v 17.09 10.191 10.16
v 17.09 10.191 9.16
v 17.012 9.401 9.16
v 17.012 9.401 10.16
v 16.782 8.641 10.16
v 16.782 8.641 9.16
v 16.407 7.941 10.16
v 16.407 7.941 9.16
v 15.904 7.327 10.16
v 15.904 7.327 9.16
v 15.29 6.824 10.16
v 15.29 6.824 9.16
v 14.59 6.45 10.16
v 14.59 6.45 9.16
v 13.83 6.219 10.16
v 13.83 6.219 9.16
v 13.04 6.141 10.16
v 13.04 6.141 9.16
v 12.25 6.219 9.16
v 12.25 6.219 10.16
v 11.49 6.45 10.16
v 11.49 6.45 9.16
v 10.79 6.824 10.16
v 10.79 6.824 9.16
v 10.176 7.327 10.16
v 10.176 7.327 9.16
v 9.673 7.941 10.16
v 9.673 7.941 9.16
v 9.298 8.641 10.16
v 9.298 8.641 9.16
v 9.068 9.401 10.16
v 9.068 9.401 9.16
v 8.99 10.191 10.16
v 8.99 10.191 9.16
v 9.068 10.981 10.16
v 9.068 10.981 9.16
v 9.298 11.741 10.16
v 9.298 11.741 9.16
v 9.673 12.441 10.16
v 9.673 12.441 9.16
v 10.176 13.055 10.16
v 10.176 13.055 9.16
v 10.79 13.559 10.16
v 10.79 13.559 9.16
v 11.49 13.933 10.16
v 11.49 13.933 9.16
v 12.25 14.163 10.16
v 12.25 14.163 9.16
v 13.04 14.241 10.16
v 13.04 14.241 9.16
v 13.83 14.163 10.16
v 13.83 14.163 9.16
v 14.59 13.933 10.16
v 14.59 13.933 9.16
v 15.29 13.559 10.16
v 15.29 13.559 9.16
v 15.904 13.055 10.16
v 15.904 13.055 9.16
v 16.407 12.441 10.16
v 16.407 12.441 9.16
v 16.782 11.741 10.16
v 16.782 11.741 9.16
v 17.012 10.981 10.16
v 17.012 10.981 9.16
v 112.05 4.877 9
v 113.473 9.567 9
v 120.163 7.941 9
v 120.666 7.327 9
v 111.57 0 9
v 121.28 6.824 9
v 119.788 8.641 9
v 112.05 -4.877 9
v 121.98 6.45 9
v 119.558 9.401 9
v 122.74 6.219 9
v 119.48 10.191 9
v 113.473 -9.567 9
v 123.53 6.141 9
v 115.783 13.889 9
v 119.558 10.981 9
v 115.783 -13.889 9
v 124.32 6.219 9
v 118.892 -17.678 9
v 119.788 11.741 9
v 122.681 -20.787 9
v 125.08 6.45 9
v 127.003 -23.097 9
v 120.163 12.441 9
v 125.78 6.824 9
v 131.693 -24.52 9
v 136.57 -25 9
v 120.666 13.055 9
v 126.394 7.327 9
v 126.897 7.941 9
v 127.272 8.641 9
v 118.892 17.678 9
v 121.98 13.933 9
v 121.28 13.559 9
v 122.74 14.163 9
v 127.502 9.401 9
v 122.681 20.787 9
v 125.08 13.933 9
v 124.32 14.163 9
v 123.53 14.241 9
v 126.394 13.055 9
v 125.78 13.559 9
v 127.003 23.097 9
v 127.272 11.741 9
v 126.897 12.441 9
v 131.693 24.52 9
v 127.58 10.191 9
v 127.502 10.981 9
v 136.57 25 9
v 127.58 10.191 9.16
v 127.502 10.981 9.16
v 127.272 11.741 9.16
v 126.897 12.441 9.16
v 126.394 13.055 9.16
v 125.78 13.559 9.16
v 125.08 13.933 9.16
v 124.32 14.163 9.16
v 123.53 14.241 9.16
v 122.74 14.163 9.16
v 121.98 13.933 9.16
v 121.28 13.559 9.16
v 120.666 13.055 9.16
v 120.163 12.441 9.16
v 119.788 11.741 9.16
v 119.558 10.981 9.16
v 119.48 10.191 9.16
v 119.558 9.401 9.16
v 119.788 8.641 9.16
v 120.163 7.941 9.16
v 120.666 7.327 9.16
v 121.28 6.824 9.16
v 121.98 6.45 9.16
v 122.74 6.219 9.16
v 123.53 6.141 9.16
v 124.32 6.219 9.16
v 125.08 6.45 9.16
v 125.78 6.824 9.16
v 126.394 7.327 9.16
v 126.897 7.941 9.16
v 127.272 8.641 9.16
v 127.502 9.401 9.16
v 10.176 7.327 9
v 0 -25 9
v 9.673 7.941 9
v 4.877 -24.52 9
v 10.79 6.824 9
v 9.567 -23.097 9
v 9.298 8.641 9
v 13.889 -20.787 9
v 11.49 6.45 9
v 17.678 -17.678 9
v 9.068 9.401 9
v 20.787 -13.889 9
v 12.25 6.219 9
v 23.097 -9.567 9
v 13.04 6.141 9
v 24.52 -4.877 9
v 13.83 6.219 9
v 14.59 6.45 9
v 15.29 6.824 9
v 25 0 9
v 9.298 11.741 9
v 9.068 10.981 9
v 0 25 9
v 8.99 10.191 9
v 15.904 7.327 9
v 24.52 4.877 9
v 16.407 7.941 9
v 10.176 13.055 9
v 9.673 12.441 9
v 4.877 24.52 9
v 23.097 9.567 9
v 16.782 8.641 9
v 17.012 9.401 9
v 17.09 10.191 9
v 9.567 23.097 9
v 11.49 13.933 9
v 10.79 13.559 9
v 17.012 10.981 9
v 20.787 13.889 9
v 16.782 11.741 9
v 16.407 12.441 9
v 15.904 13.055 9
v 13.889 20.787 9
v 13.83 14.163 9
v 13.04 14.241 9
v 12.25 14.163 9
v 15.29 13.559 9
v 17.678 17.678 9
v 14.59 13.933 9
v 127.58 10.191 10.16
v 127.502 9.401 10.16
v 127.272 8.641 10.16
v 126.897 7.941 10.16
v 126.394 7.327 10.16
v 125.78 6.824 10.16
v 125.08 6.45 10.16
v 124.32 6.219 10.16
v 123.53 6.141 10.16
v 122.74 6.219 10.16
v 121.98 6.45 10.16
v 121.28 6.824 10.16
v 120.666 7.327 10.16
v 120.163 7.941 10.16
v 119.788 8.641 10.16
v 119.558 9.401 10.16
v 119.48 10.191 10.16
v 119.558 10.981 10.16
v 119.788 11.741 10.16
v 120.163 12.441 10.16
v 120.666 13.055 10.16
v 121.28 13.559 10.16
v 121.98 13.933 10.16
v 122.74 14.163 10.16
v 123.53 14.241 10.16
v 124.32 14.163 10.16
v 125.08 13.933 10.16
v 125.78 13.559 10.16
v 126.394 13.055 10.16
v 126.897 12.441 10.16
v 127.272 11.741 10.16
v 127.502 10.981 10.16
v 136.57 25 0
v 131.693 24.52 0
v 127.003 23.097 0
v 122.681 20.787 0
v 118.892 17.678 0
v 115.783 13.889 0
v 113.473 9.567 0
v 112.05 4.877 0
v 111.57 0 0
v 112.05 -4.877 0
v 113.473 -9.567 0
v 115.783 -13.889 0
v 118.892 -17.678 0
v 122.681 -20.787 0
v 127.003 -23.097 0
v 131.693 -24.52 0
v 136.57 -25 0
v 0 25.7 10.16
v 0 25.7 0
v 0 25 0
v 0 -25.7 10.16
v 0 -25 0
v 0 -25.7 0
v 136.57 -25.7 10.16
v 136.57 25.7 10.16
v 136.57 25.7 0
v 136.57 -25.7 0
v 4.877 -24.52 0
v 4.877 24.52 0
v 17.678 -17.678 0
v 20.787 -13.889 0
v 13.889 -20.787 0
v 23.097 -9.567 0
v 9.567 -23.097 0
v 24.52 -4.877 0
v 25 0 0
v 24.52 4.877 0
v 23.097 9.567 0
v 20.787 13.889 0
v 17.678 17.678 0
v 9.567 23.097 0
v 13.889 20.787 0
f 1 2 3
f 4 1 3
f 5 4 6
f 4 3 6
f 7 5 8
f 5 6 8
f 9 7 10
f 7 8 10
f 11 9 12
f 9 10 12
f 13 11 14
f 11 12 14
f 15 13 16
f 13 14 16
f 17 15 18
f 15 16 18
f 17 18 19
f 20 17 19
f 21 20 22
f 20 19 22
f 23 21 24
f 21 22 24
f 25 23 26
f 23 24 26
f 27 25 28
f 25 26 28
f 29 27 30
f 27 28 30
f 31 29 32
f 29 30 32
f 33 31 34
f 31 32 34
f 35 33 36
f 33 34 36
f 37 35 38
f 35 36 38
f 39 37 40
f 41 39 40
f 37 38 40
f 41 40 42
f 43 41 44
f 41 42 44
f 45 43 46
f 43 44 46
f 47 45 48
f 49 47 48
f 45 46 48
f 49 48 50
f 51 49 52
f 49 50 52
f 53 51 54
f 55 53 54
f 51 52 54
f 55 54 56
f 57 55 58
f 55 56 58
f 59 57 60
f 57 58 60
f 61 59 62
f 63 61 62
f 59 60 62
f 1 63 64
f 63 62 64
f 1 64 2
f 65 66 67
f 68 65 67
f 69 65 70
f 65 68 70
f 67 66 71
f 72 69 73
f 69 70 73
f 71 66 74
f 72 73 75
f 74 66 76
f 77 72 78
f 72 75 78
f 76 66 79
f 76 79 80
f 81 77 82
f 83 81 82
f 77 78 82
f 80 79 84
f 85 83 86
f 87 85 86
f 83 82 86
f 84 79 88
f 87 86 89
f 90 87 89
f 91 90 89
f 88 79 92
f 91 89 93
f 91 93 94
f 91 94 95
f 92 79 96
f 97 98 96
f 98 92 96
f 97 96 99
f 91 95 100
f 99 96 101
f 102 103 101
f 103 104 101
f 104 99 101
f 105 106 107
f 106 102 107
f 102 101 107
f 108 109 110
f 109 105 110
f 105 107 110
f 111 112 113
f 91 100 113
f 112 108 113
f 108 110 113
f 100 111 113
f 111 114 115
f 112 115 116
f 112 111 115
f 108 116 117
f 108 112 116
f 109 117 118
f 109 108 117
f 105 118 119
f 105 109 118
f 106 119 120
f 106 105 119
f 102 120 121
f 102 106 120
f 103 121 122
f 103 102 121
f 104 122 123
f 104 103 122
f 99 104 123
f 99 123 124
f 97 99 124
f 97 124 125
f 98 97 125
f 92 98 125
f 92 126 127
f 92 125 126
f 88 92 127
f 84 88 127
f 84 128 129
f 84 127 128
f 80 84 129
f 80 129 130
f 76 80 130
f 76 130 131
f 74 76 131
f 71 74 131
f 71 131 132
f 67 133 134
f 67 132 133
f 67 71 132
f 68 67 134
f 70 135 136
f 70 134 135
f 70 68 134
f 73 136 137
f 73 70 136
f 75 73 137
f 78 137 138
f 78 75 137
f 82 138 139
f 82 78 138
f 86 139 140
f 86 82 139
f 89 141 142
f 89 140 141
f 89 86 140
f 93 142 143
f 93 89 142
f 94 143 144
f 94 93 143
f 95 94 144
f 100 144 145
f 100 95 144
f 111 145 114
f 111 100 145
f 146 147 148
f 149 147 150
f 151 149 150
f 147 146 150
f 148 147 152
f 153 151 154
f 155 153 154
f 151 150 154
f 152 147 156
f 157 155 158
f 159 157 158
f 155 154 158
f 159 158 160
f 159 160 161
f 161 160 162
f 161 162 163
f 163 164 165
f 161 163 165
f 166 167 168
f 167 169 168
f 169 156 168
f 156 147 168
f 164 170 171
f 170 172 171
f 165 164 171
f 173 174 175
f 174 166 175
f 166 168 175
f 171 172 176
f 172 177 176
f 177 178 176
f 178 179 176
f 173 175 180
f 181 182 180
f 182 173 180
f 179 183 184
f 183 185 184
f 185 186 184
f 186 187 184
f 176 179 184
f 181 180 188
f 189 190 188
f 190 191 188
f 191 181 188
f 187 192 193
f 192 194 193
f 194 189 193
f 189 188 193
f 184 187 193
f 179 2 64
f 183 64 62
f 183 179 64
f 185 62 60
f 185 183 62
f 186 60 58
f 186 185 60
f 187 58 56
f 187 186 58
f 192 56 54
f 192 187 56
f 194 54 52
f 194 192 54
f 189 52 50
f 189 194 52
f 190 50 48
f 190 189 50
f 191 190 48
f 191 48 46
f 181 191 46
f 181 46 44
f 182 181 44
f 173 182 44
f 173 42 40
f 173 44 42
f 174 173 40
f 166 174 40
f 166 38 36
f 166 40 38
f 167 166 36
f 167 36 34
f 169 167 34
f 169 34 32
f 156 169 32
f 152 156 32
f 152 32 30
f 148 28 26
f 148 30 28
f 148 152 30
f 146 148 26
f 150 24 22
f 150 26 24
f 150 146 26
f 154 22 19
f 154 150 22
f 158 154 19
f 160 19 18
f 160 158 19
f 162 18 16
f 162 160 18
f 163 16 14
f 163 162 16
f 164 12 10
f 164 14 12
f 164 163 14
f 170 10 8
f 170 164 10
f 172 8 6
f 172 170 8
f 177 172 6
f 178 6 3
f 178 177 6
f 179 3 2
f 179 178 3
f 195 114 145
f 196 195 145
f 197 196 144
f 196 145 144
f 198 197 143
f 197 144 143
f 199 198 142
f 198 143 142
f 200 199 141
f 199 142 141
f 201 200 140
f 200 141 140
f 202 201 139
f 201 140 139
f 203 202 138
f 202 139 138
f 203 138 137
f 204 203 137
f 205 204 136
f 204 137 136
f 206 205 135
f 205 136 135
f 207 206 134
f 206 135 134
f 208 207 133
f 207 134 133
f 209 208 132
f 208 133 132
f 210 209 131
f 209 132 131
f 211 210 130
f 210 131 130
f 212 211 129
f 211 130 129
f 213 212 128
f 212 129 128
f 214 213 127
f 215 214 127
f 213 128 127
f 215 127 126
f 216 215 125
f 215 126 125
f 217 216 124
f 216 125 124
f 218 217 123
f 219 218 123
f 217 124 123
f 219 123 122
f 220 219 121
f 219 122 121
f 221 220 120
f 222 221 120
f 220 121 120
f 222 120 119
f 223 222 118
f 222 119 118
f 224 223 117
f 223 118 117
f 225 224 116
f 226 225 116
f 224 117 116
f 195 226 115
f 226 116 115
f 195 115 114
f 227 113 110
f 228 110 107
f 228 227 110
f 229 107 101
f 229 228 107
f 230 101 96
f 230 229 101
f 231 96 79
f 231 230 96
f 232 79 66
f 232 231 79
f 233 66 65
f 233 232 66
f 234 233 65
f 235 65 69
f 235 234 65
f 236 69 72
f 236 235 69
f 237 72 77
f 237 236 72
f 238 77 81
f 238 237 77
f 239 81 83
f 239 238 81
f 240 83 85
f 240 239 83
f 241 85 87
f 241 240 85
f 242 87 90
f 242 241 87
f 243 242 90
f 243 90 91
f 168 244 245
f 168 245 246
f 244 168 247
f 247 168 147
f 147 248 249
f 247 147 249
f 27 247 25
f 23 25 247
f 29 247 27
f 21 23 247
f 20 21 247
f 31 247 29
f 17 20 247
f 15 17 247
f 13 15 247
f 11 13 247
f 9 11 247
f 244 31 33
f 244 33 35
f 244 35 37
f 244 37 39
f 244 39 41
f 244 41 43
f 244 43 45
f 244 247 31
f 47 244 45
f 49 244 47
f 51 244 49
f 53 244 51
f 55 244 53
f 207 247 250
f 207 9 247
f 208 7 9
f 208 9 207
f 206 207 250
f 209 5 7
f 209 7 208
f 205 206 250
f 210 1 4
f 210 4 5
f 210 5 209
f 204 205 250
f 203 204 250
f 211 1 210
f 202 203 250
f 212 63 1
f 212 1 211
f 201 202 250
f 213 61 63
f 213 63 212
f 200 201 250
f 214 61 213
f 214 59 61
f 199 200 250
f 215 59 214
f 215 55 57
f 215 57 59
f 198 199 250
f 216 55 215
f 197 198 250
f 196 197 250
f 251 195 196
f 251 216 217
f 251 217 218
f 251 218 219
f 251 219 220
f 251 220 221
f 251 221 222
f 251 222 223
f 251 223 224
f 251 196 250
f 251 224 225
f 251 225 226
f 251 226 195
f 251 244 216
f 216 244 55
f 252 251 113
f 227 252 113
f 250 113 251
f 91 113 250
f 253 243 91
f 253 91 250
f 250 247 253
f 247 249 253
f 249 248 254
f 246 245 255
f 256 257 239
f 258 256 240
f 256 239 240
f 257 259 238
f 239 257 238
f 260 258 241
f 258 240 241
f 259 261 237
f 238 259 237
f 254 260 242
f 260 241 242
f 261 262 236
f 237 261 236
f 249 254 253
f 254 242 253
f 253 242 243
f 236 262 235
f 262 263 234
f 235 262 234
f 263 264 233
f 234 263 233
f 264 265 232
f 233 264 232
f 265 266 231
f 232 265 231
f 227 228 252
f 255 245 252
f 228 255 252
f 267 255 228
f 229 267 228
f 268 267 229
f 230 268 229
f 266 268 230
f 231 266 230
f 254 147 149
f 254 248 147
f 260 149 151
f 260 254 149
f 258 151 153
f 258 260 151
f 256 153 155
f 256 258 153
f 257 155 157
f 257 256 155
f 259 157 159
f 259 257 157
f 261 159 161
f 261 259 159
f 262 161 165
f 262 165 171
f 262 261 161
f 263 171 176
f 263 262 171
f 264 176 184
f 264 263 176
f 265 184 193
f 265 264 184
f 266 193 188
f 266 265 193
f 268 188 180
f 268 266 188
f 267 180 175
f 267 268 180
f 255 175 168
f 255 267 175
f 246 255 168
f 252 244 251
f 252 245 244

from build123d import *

# Parameters (mm, degrees)
F0_R     = 25.7
F0_R_2   = 25
F0_R_3   = 4.05
F1_DEPTH = 9.16
F3_W     = 136.57
F3_H     = 51.4
F4_DEPTH = 9.16
F2_R     = 25
F2_R_2   = 4.05
F5_DEPTH = 9
F6_DEPTH = 25
F7_W     = 25.7
F7_H     = 74.087158006
F7_H_2   = 74.0871579793
F8_DEPTH = 25
F9_DEPTH = 1


with BuildPart() as f1:
    # F0 (on Top) → F1 (new body)
    with BuildSketch(Plane.XY):
        Circle(F0_R)
        Circle(F0_R_2, mode=Mode.SUBTRACT)
        Circle(F0_R_2)
        with Locations((13.04, 10.1912168066)):
            Circle(F0_R_3, mode=Mode.SUBTRACT)
    extrude(amount=F1_DEPTH)



with BuildPart() as f1b:
    # F0 (on Top) → F1, piece 2 (new body)
    with BuildSketch(Plane.XY):
        with Locations((136.57, 0)):
            Circle(F0_R)
        with Locations((136.57, 0)):
            Circle(F0_R_2, mode=Mode.SUBTRACT)
        with Locations((136.57, 0)):
            Circle(F0_R_2)
        with Locations((123.53, 10.1912168066)):
            Circle(F0_R_3, mode=Mode.SUBTRACT)
    extrude(amount=F1_DEPTH)


with BuildPart() as f1_1:
    add(f1.part)

    add(f1b.part)  # F4 merges F1b
    # F3 (on Top) → F4 (join)
    with BuildSketch(Plane.XY):
        with Locations((68.285, 0)):
            Rectangle(F3_W, F3_H)
    extrude(amount=F4_DEPTH)

    # F2 (on Top) → F5 (cut)
    with BuildSketch(Plane.XY):
        Circle(F2_R)
        with Locations((13.04, 10.1912168066)):
            Circle(F2_R_2, mode=Mode.SUBTRACT)
        with Locations((136.57, 0)):
            Circle(F2_R)
        with Locations((123.53, 10.1912168066)):
            Circle(F2_R_2, mode=Mode.SUBTRACT)
    extrude(amount=F5_DEPTH, mode=Mode.SUBTRACT)

    # F6 (cut): faces of the model
    f6_faces = [f1_1.faces().sort_by_distance(p)[0] for p in [
        (123.53, 10.1912168066, 0),
        (13.04, 10.1912168066, 0),
    ]]
    extrude(f6_faces, amount=-F6_DEPTH, mode=Mode.SUBTRACT)

    # F7 (on Top) → F8 (cut)
    with BuildSketch(Plane.XY):
        with Locations((-12.85, -2.68e-08)):
            Rectangle(F7_W, F7_H)
        with Locations((149.42, 1.34e-08)):
            Rectangle(F7_W, F7_H_2)
    extrude(amount=F8_DEPTH, mode=Mode.SUBTRACT)

    # F9 (add): a face of the model
    f9_faces = [f1_1.faces().sort_by_distance(p)[0] for p in [
        (68.285, -0.1518521362, 9.16),
    ]]
    extrude(f9_faces, amount=F9_DEPTH)


solid = f1_1.part
